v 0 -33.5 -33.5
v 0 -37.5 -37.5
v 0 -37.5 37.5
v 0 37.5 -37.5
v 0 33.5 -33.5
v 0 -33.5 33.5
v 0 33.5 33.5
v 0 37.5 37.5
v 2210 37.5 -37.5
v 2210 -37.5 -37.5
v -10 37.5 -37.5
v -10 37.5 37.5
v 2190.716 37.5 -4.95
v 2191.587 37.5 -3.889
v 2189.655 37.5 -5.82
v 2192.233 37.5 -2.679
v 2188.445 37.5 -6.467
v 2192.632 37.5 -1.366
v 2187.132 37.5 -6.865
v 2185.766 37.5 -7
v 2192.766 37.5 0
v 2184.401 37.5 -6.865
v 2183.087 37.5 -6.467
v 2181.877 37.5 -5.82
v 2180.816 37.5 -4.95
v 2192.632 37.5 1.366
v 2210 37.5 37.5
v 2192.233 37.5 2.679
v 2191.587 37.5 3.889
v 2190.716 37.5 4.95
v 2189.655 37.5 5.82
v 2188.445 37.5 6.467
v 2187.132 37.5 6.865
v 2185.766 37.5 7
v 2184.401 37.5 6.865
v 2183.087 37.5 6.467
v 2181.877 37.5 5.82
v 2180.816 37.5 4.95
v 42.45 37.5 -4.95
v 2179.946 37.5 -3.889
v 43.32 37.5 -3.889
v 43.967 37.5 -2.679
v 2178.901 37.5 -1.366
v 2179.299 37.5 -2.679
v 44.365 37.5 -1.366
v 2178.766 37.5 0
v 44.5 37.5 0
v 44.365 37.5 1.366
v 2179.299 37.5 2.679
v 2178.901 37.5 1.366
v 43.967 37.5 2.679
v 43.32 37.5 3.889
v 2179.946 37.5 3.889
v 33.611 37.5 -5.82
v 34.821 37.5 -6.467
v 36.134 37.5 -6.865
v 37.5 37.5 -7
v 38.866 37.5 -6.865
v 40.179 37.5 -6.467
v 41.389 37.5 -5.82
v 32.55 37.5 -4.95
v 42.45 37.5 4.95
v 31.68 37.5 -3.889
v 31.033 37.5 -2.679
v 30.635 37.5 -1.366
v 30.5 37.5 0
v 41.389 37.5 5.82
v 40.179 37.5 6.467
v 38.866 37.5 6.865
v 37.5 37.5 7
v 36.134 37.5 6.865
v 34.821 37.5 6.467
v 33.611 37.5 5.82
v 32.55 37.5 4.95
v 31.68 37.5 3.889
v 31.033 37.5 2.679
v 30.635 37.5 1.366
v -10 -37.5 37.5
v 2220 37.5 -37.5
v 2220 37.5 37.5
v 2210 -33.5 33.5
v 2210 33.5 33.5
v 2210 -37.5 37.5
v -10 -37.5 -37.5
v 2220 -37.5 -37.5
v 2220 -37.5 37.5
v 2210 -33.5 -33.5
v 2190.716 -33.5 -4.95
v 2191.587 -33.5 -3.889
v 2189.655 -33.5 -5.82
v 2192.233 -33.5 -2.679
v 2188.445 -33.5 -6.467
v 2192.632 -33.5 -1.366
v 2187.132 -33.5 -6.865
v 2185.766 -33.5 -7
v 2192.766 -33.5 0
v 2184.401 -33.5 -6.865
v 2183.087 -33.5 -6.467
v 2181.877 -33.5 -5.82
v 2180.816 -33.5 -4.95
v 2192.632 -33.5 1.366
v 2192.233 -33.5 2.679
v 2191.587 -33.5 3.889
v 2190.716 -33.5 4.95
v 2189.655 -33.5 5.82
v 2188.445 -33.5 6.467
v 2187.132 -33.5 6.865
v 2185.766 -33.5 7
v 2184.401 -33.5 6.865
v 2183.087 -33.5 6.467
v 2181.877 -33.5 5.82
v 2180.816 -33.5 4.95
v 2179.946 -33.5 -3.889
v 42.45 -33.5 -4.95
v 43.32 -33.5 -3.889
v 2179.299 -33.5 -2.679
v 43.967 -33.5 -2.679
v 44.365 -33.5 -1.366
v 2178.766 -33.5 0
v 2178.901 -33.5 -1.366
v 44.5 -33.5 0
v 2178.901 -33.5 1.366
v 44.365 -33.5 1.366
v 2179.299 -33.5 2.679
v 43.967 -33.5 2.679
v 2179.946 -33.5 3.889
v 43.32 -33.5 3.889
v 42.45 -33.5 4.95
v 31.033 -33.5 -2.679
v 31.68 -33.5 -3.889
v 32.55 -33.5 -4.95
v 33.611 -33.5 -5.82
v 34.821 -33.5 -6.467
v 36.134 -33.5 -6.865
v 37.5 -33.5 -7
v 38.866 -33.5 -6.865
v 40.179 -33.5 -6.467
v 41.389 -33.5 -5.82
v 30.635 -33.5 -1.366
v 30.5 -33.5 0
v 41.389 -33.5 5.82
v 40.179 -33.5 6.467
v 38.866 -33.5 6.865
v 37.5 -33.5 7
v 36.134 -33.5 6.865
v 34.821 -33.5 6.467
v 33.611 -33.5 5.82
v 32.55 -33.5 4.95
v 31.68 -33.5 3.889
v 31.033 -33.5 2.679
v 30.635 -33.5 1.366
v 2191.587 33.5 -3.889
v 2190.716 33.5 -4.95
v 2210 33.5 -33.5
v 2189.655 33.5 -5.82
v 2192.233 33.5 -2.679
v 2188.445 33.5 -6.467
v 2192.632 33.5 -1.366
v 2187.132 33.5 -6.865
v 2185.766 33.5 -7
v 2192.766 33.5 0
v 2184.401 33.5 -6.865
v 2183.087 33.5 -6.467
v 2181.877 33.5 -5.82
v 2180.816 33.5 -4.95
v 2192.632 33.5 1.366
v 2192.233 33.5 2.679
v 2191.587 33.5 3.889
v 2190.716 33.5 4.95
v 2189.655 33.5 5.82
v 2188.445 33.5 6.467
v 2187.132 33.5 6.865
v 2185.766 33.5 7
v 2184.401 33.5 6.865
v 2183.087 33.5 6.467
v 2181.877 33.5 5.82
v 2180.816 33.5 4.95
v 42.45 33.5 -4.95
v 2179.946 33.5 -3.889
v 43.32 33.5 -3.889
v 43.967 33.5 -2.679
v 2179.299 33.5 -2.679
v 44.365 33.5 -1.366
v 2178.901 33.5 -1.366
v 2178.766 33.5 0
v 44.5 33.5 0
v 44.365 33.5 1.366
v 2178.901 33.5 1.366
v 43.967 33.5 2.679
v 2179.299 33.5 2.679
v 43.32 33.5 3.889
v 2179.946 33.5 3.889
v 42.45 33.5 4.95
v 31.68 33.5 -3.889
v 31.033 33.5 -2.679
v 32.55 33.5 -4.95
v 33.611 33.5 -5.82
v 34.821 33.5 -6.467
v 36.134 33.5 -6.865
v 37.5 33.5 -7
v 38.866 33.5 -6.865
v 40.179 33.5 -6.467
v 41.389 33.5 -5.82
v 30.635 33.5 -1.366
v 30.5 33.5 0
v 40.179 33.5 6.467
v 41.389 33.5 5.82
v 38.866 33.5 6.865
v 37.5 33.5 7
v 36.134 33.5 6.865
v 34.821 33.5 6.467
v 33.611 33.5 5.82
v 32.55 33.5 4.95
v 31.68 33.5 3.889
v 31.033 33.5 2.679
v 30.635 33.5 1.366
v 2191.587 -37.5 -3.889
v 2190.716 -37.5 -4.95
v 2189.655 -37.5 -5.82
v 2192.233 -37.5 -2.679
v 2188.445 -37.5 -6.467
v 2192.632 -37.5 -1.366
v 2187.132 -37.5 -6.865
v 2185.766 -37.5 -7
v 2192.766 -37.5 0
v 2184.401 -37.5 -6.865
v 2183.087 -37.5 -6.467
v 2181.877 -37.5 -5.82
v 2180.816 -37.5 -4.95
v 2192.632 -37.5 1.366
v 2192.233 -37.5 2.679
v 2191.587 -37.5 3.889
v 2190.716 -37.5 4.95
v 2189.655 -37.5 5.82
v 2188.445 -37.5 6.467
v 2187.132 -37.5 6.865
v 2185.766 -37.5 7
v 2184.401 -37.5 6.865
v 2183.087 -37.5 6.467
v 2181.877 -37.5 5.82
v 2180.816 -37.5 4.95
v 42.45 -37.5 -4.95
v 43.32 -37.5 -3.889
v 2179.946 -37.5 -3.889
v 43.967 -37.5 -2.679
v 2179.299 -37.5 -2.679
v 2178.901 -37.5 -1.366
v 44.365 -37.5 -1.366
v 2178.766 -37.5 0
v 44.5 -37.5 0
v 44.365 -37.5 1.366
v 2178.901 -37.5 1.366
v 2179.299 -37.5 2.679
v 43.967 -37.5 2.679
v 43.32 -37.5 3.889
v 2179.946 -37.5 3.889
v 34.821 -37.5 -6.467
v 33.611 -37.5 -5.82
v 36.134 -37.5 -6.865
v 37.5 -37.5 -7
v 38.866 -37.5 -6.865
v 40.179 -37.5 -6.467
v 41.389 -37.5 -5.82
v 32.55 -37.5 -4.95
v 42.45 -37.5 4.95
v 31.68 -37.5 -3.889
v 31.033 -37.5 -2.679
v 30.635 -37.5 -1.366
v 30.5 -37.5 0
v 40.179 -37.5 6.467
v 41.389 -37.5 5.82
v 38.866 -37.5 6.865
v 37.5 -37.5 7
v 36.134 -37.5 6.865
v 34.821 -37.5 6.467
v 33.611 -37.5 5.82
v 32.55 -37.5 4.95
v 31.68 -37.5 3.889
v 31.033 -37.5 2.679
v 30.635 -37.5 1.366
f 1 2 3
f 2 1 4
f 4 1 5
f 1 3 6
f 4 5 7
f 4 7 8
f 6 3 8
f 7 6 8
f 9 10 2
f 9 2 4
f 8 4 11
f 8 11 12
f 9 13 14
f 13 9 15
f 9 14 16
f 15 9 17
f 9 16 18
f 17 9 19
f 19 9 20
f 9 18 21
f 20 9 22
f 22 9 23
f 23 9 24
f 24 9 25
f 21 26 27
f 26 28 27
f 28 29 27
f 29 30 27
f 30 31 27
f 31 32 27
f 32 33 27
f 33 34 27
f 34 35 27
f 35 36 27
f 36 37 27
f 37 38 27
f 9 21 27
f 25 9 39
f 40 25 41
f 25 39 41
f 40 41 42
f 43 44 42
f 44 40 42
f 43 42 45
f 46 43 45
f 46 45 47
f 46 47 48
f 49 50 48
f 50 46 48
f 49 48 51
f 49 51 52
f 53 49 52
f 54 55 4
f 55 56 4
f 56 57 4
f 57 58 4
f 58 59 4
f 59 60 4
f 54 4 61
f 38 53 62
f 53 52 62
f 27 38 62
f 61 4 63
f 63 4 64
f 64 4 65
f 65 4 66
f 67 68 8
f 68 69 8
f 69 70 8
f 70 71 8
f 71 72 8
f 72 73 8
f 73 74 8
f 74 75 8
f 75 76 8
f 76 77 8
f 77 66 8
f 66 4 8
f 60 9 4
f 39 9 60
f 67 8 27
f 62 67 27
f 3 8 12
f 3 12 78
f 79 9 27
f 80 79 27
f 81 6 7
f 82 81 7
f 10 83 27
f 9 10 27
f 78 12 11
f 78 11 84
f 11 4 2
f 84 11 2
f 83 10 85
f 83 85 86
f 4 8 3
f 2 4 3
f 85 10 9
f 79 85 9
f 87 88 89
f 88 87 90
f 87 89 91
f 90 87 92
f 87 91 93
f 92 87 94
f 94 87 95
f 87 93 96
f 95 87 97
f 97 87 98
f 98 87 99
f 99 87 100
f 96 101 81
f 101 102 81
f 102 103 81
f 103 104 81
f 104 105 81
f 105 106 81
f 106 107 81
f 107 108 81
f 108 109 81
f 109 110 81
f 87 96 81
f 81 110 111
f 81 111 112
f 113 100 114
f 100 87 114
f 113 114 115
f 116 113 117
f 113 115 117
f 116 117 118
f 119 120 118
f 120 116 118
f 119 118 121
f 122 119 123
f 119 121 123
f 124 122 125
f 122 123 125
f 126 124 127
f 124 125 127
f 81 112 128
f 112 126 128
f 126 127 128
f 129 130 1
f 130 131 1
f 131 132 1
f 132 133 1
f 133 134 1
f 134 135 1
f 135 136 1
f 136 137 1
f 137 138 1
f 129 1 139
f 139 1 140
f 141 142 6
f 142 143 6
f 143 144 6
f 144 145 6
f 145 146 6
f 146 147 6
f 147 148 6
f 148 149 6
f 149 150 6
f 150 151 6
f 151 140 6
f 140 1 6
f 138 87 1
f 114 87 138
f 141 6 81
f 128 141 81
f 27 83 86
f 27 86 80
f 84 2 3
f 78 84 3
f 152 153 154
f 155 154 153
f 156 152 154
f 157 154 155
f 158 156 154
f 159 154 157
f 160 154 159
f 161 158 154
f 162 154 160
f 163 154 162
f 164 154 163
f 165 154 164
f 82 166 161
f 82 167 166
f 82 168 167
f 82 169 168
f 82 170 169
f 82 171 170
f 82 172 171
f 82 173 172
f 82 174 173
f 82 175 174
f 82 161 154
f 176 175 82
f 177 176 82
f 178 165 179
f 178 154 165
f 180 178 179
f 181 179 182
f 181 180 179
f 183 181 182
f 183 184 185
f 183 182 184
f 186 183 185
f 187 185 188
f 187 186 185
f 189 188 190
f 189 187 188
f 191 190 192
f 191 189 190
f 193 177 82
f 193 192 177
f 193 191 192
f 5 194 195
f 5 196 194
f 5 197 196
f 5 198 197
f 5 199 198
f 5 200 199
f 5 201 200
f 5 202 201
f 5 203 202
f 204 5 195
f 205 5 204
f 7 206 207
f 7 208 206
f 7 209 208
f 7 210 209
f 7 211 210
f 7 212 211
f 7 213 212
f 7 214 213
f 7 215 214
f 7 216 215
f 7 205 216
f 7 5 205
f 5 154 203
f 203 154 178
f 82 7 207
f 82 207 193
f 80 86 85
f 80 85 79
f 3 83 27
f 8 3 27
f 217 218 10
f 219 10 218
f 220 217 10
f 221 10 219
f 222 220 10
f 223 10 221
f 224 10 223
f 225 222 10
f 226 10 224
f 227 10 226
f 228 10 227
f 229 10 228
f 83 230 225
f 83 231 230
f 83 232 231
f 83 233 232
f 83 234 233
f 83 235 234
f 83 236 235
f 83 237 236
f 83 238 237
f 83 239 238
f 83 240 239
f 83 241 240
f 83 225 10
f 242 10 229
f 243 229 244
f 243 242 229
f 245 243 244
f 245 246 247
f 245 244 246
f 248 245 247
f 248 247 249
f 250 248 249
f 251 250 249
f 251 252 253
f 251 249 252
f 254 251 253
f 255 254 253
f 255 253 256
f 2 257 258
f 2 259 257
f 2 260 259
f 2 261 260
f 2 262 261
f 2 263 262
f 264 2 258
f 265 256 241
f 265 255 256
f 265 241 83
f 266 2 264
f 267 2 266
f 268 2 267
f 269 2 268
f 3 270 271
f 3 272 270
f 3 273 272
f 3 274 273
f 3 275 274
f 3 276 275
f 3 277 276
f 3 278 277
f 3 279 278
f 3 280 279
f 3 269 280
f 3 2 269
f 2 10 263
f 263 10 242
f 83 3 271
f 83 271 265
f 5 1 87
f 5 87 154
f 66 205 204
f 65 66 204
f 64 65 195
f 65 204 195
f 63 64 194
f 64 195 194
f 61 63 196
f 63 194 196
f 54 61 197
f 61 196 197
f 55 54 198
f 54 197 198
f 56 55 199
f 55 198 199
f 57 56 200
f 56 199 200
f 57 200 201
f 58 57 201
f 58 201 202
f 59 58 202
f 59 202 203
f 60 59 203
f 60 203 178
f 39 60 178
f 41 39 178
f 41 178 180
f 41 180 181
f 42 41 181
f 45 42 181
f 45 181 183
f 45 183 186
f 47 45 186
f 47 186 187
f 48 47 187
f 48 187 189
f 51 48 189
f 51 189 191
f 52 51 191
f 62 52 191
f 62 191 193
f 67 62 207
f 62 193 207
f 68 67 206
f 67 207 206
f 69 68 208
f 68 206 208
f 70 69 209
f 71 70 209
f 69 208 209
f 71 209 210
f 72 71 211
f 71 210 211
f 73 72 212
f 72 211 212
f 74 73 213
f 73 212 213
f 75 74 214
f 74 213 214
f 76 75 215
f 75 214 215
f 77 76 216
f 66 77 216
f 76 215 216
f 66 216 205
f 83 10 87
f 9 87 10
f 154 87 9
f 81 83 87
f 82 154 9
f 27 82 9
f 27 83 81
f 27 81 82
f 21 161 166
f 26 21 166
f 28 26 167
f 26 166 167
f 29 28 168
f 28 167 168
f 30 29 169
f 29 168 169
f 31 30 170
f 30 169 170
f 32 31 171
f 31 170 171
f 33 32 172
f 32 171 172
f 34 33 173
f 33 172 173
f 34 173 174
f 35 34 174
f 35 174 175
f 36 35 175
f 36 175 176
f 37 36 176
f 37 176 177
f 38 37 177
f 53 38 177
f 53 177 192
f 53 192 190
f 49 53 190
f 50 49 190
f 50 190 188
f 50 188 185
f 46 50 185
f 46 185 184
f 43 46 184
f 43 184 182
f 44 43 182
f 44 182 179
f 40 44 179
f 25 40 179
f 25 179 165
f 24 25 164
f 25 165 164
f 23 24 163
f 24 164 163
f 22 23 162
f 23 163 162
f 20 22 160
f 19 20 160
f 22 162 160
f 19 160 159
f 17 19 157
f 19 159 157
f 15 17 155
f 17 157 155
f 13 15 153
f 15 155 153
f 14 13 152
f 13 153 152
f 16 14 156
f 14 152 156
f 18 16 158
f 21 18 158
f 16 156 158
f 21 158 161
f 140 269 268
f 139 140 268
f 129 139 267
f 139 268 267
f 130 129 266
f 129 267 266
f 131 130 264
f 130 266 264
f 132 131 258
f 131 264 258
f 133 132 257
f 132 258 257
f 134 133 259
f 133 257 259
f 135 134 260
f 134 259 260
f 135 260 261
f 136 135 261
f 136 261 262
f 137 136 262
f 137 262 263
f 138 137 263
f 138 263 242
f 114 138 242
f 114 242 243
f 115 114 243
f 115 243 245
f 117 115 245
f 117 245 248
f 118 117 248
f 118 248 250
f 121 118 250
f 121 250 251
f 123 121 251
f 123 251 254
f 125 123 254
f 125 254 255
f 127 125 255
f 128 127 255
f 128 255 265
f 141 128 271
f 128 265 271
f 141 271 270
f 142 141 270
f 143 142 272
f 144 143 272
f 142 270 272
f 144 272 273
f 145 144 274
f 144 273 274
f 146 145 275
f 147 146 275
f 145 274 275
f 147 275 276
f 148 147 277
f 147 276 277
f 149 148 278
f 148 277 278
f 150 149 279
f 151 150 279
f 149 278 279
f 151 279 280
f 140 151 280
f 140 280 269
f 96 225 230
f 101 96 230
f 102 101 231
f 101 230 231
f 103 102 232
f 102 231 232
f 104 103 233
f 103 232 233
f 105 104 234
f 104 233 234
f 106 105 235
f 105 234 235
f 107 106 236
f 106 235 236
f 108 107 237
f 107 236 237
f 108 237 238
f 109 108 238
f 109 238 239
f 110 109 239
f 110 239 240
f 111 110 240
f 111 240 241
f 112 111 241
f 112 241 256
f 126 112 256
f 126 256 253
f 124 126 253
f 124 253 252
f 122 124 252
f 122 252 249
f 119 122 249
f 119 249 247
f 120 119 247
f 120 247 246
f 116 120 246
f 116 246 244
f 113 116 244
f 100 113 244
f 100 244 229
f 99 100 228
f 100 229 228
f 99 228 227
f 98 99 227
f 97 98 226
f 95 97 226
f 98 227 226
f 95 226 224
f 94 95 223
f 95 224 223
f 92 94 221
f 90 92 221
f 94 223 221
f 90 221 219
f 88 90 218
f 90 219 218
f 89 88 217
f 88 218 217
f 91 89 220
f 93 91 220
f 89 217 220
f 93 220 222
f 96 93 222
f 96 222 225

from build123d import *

# Parameters (mm, degrees)
F0_W     = 75
F0_H     = 75
F0_W_2   = 67
F0_H_2   = 67
F1_DEPTH = 2210
F2_W     = 75
F2_H     = 75
F3_DEPTH = 10
F4_W     = 75
F4_H     = 75
F5_DEPTH = 10
F6_R     = 7
F7_DEPTH = 75


with BuildPart() as f1:
    # F0 (on Right) → F1 (new body)
    with BuildSketch(Plane.YZ):
        Rectangle(F0_W, F0_H)
        Rectangle(F0_W_2, F0_H_2, mode=Mode.SUBTRACT)
    extrude(amount=F1_DEPTH)

    # F6 (on face) → F7 (cut)
    with BuildSketch(Plane.XZ.offset(37.5)):
        with BuildLine():
            ThreePointArc((44.5, 0), (37.5, 7), (30.5, 0))
            ThreePointArc((30.5, 0), (37.5, -7), (44.5, 0))
        make_face()
        with Locations((2185.76622, 0)):
            Circle(F6_R)
    extrude(amount=-F7_DEPTH, mode=Mode.SUBTRACT)


with BuildPart() as f3:
    # F2 (on face) → F3 (new body)
    with BuildSketch(Plane.YZ.offset(2210)):
        Rectangle(F2_W, F2_H)
    extrude(amount=F3_DEPTH)


with BuildPart() as f5:
    # F4 (on face) → F5 (new body)
    with BuildSketch(Plane(origin=(0, 0, 0), x_dir=(0, -1, 0), z_dir=(-1, 0, 0))):
        Rectangle(F4_W, F4_H)
    extrude(amount=F5_DEPTH)


solid = Compound([f1.part, f3.part, f5.part])
